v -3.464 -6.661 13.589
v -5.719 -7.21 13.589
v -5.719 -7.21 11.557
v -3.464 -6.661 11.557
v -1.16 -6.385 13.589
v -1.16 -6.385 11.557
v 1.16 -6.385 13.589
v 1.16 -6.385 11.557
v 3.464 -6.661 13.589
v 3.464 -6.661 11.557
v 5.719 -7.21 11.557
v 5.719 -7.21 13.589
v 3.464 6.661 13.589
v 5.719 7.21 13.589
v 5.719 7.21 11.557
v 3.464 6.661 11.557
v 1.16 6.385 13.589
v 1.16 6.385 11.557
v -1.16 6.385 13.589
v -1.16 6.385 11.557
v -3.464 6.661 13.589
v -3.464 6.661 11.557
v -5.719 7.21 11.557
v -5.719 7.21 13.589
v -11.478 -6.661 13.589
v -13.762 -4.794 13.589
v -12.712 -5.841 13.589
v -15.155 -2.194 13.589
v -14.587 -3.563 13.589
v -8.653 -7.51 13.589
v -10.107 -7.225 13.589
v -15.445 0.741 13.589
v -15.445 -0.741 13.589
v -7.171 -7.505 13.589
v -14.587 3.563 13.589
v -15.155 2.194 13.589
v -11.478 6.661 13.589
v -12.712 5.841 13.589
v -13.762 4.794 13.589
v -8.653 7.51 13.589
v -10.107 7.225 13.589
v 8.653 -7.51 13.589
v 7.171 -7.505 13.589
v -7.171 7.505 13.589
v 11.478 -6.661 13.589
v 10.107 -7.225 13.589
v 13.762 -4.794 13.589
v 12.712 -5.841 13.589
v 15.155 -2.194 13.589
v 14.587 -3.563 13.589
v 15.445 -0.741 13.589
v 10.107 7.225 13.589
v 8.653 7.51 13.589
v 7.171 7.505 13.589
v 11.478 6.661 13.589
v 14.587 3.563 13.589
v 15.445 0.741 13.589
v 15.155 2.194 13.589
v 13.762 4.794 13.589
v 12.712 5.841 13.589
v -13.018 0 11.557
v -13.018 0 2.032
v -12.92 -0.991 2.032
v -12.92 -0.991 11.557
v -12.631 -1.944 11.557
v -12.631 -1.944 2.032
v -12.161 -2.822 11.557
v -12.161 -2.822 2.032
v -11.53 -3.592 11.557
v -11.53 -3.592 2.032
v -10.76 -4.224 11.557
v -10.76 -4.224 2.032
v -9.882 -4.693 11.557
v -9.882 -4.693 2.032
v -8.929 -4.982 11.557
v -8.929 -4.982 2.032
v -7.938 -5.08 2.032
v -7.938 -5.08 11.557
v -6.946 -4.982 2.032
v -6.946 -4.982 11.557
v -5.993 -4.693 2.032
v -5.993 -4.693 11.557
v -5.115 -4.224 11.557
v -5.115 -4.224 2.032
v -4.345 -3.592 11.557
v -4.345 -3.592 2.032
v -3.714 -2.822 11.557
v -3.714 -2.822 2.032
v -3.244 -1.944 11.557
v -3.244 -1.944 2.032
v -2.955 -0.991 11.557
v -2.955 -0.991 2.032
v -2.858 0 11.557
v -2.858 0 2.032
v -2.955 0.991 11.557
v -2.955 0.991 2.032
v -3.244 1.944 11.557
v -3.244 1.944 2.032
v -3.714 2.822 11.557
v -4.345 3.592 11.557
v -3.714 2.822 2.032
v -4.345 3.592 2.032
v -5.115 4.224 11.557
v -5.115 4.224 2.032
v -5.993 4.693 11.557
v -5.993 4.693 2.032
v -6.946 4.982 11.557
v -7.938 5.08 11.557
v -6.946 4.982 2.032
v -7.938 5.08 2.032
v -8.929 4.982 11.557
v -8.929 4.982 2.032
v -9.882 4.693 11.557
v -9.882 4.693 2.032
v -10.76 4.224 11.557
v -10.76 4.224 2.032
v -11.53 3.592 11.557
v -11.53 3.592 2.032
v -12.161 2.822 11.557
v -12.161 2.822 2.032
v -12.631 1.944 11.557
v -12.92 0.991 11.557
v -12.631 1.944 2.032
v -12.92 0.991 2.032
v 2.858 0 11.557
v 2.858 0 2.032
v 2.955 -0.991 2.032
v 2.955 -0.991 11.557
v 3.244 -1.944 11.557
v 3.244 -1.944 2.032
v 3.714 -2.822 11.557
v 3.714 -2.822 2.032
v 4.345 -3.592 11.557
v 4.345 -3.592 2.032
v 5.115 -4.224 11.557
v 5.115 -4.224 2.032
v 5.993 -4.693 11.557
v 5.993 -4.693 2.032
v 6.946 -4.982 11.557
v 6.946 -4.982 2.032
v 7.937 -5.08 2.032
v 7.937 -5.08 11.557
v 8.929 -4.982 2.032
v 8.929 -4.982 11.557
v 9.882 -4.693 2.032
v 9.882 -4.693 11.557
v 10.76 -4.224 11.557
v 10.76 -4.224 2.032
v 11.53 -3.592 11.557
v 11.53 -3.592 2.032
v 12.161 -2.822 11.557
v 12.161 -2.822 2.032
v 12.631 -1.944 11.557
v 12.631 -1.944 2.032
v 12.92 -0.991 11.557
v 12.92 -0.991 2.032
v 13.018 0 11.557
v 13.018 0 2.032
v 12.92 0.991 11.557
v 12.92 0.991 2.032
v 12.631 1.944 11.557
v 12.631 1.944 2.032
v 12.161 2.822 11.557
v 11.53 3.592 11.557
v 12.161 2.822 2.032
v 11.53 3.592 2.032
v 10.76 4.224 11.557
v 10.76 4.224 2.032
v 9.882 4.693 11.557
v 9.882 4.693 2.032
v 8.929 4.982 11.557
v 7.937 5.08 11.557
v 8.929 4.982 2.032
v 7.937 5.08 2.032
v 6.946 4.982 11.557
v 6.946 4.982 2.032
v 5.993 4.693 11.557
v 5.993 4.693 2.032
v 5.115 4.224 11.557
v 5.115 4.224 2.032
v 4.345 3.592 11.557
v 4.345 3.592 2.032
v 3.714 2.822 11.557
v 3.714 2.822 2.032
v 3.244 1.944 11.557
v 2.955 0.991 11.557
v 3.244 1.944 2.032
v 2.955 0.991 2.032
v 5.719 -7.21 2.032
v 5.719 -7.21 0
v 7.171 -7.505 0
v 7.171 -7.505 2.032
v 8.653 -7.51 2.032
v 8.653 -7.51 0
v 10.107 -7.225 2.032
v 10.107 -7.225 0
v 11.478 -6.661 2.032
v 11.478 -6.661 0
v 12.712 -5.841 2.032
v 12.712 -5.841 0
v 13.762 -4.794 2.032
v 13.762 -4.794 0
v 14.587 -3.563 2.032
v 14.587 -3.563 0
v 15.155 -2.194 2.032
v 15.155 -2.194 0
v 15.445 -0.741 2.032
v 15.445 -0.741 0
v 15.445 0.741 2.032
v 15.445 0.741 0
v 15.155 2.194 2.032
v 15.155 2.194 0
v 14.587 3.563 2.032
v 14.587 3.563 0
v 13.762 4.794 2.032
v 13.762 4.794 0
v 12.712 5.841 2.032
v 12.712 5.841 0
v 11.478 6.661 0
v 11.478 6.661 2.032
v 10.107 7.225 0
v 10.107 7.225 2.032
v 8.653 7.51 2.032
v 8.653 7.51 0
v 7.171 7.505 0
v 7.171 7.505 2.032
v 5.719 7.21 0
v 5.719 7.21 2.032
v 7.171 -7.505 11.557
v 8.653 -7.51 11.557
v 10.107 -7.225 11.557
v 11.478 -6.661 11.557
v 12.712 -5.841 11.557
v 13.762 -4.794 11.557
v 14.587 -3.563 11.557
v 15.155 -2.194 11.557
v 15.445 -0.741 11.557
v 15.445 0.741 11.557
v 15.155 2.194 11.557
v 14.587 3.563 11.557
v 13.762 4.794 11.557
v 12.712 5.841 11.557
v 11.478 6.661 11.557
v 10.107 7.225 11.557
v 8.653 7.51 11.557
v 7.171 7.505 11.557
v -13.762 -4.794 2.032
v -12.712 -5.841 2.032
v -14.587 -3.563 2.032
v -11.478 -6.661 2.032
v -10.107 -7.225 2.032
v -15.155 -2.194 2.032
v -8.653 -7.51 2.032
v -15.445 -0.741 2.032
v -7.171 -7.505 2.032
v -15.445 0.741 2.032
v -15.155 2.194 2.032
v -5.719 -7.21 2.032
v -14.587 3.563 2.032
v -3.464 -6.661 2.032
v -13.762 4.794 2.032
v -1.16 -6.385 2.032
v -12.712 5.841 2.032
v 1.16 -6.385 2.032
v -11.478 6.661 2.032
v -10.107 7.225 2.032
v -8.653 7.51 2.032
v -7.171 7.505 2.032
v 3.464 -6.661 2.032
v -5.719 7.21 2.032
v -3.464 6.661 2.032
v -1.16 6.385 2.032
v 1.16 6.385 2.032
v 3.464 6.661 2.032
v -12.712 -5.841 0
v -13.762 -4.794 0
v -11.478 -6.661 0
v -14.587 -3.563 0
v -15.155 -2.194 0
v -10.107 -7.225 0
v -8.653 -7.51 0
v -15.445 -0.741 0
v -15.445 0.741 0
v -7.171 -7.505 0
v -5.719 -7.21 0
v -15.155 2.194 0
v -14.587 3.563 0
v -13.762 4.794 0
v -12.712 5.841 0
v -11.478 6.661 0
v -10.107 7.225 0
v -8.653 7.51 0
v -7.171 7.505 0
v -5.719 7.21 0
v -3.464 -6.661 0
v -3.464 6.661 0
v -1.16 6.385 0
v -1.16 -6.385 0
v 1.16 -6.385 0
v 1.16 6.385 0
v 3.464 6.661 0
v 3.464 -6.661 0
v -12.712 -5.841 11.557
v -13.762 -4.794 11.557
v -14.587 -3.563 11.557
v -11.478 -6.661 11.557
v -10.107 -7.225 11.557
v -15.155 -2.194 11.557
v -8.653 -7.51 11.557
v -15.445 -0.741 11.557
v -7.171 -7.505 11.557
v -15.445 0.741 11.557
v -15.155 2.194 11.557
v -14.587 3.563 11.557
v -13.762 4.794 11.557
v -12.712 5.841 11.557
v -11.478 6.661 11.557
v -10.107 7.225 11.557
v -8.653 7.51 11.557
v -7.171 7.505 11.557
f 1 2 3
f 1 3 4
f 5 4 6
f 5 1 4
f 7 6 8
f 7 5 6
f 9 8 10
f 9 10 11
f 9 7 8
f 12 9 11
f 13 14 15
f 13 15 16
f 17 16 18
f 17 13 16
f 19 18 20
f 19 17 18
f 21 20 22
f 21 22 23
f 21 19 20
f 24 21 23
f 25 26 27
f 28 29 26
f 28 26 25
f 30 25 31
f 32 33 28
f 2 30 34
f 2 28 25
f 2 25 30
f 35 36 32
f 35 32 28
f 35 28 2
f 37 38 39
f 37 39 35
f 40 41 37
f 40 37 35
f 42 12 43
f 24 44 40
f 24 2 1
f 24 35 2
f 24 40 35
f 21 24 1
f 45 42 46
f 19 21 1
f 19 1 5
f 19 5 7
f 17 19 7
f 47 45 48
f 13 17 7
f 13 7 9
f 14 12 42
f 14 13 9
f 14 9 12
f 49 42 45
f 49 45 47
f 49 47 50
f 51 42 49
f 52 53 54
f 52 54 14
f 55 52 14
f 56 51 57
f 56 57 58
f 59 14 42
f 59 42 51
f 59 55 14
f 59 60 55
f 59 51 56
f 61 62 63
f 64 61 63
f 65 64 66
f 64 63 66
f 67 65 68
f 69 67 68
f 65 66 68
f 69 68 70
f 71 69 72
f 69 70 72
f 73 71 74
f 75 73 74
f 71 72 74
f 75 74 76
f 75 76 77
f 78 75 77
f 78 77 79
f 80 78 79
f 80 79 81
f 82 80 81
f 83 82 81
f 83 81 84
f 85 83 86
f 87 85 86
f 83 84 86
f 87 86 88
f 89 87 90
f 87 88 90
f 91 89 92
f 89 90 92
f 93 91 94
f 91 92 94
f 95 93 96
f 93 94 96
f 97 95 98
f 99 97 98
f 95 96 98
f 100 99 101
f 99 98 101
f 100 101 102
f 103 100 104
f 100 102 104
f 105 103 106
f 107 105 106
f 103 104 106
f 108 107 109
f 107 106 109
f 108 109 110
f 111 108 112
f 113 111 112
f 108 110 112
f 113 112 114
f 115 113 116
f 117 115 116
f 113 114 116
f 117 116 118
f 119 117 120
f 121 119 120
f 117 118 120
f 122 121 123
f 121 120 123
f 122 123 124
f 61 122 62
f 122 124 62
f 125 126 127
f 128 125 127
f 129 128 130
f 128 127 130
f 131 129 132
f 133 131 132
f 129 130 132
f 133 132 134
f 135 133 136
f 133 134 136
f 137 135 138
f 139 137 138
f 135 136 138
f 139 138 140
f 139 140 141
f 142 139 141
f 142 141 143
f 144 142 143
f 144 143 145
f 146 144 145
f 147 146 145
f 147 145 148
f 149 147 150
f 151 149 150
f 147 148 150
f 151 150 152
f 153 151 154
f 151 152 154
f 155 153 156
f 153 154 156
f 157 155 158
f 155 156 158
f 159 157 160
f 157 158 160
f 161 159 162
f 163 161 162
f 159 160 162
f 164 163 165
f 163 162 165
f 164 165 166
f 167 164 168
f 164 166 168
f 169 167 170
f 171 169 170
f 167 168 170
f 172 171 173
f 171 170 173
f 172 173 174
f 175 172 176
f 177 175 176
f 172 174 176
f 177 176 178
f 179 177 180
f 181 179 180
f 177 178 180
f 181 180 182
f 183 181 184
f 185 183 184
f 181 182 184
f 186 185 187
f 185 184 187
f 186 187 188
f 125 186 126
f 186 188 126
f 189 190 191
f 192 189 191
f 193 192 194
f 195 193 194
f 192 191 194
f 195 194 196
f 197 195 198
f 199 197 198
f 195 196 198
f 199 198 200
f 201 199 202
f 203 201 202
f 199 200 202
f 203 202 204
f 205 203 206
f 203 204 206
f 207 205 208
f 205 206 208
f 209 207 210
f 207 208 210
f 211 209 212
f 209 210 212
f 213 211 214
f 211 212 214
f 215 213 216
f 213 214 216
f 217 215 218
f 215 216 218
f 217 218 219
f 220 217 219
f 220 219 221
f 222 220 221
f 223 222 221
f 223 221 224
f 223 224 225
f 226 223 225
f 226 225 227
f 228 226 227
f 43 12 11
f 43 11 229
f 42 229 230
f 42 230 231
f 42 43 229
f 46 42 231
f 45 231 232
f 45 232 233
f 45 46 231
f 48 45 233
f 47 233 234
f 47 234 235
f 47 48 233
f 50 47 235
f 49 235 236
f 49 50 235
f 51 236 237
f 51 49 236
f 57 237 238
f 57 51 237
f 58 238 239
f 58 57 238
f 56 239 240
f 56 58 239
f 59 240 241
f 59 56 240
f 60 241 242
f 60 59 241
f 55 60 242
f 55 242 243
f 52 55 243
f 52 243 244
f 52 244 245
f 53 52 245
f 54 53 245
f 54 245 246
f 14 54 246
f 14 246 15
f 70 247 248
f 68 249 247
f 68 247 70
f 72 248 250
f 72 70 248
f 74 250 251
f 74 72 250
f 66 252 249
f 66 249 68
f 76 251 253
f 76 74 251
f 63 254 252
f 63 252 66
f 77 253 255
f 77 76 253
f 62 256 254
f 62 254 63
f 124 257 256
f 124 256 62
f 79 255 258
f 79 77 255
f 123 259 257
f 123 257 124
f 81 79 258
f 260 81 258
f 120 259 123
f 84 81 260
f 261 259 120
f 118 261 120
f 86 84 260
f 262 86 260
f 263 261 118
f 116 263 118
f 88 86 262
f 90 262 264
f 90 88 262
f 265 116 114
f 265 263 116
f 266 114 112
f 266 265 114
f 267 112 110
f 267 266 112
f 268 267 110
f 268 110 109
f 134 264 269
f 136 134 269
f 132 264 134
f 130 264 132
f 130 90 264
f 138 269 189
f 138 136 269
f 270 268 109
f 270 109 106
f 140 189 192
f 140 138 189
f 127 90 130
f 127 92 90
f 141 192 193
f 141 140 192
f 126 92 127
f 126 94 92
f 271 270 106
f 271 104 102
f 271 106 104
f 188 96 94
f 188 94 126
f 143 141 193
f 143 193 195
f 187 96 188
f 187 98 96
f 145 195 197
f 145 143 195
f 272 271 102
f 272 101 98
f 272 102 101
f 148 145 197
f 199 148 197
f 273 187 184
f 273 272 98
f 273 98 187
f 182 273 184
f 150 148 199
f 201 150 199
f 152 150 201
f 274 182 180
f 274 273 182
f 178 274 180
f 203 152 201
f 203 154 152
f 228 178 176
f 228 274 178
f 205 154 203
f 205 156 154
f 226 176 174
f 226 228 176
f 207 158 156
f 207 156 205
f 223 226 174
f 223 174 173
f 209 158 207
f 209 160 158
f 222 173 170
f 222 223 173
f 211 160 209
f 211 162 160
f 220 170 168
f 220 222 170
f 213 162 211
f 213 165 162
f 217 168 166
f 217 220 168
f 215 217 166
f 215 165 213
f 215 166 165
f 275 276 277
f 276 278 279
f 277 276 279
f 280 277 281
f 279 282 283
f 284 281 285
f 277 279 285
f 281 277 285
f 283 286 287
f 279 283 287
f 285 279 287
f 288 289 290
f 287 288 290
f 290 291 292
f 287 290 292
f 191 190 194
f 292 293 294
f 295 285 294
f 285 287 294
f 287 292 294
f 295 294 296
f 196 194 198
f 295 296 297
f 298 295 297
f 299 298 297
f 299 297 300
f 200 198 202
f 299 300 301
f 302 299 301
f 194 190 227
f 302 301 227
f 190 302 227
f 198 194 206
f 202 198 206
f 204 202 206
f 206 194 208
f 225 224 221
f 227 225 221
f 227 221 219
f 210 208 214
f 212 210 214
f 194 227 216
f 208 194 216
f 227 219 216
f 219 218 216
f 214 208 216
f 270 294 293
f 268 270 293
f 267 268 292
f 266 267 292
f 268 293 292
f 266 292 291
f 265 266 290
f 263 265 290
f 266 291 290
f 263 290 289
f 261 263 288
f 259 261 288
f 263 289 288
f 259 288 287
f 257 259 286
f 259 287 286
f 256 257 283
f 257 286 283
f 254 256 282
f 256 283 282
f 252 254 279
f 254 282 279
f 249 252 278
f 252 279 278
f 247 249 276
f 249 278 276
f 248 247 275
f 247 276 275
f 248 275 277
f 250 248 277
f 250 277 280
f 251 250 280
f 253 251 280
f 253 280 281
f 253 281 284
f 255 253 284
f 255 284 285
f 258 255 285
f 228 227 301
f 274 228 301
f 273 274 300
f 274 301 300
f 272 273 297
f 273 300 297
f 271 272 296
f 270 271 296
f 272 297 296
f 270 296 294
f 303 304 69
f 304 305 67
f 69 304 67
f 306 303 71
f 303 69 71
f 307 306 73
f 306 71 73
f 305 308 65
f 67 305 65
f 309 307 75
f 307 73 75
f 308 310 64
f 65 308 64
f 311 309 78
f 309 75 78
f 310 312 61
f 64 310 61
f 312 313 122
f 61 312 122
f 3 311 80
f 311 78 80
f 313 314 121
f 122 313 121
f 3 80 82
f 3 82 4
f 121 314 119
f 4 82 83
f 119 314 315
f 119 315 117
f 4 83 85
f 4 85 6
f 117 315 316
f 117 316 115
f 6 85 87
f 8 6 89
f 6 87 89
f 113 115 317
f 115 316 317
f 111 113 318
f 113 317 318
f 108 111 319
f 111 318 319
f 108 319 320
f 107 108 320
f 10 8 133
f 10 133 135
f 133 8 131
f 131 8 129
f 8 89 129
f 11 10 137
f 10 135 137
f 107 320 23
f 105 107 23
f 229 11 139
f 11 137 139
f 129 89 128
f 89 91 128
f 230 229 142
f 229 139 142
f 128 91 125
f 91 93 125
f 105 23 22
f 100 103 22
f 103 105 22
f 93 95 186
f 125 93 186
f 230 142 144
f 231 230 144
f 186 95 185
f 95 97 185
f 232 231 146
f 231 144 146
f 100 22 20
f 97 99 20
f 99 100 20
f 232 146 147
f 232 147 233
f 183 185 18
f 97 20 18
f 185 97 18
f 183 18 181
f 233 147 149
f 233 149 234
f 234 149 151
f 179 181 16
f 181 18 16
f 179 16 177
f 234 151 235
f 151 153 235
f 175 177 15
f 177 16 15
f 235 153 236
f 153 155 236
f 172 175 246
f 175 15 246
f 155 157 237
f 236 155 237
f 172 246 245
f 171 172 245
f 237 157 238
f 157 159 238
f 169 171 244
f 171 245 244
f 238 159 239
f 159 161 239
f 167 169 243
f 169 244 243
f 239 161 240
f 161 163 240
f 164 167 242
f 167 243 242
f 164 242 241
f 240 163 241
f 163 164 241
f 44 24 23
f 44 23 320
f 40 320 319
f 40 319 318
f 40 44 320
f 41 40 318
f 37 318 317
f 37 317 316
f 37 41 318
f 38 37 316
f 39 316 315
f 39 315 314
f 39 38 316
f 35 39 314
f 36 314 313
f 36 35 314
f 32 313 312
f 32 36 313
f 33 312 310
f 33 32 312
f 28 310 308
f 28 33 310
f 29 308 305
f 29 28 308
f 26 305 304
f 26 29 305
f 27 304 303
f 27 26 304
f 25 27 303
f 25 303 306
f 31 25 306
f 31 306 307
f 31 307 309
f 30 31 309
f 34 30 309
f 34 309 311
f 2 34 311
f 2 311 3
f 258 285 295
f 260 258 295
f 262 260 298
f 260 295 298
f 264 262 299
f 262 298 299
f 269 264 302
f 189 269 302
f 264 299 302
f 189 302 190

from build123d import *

# Parameters (mm, degrees)
BOSS_EXTRUDE1_DEPTH = 2.032
SKETCH4_R           = 5.08
BOSS_EXTRUDE2_DEPTH = 9.525


with BuildPart() as part:
    # Sketch2 → Boss-Extrude1 (new body)
    with BuildSketch(Plane.XY):
        with BuildLine():
            ThreePointArc((-5.718518673, 7.210065208), (-15.4813, 0), (-5.718518673, -7.210065208))
            ThreePointArc((-5.718518673, -7.210065208), (0, -6.35), (5.718518673, -7.210065208))
            ThreePointArc((5.718518673, -7.210065208), (15.4813, 0), (5.718518673, 7.210065208))
            ThreePointArc((5.718518673, 7.210065208), (0, 6.35), (-5.718518673, 7.210065208))
        make_face()
    boss_extrude1 = extrude(amount=BOSS_EXTRUDE1_DEPTH)

    # Sketch4 → Boss-Extrude2 (add)
    with BuildSketch(Plane.XY.offset(2.032)):
        with Locations(Location((-7.9375, 0, 0), (0, 0, 180))):
            Circle(SKETCH4_R)
        with Locations(Location((7.9375, 0, 0), (0, 0, 180))):
            Circle(SKETCH4_R)
    extrude(amount=BOSS_EXTRUDE2_DEPTH)

    # Mirror1: Boss-Extrude1 across plane
    add(boss_extrude1.mirror(Plane.XY.offset(6.7945)))


solid = part.part
